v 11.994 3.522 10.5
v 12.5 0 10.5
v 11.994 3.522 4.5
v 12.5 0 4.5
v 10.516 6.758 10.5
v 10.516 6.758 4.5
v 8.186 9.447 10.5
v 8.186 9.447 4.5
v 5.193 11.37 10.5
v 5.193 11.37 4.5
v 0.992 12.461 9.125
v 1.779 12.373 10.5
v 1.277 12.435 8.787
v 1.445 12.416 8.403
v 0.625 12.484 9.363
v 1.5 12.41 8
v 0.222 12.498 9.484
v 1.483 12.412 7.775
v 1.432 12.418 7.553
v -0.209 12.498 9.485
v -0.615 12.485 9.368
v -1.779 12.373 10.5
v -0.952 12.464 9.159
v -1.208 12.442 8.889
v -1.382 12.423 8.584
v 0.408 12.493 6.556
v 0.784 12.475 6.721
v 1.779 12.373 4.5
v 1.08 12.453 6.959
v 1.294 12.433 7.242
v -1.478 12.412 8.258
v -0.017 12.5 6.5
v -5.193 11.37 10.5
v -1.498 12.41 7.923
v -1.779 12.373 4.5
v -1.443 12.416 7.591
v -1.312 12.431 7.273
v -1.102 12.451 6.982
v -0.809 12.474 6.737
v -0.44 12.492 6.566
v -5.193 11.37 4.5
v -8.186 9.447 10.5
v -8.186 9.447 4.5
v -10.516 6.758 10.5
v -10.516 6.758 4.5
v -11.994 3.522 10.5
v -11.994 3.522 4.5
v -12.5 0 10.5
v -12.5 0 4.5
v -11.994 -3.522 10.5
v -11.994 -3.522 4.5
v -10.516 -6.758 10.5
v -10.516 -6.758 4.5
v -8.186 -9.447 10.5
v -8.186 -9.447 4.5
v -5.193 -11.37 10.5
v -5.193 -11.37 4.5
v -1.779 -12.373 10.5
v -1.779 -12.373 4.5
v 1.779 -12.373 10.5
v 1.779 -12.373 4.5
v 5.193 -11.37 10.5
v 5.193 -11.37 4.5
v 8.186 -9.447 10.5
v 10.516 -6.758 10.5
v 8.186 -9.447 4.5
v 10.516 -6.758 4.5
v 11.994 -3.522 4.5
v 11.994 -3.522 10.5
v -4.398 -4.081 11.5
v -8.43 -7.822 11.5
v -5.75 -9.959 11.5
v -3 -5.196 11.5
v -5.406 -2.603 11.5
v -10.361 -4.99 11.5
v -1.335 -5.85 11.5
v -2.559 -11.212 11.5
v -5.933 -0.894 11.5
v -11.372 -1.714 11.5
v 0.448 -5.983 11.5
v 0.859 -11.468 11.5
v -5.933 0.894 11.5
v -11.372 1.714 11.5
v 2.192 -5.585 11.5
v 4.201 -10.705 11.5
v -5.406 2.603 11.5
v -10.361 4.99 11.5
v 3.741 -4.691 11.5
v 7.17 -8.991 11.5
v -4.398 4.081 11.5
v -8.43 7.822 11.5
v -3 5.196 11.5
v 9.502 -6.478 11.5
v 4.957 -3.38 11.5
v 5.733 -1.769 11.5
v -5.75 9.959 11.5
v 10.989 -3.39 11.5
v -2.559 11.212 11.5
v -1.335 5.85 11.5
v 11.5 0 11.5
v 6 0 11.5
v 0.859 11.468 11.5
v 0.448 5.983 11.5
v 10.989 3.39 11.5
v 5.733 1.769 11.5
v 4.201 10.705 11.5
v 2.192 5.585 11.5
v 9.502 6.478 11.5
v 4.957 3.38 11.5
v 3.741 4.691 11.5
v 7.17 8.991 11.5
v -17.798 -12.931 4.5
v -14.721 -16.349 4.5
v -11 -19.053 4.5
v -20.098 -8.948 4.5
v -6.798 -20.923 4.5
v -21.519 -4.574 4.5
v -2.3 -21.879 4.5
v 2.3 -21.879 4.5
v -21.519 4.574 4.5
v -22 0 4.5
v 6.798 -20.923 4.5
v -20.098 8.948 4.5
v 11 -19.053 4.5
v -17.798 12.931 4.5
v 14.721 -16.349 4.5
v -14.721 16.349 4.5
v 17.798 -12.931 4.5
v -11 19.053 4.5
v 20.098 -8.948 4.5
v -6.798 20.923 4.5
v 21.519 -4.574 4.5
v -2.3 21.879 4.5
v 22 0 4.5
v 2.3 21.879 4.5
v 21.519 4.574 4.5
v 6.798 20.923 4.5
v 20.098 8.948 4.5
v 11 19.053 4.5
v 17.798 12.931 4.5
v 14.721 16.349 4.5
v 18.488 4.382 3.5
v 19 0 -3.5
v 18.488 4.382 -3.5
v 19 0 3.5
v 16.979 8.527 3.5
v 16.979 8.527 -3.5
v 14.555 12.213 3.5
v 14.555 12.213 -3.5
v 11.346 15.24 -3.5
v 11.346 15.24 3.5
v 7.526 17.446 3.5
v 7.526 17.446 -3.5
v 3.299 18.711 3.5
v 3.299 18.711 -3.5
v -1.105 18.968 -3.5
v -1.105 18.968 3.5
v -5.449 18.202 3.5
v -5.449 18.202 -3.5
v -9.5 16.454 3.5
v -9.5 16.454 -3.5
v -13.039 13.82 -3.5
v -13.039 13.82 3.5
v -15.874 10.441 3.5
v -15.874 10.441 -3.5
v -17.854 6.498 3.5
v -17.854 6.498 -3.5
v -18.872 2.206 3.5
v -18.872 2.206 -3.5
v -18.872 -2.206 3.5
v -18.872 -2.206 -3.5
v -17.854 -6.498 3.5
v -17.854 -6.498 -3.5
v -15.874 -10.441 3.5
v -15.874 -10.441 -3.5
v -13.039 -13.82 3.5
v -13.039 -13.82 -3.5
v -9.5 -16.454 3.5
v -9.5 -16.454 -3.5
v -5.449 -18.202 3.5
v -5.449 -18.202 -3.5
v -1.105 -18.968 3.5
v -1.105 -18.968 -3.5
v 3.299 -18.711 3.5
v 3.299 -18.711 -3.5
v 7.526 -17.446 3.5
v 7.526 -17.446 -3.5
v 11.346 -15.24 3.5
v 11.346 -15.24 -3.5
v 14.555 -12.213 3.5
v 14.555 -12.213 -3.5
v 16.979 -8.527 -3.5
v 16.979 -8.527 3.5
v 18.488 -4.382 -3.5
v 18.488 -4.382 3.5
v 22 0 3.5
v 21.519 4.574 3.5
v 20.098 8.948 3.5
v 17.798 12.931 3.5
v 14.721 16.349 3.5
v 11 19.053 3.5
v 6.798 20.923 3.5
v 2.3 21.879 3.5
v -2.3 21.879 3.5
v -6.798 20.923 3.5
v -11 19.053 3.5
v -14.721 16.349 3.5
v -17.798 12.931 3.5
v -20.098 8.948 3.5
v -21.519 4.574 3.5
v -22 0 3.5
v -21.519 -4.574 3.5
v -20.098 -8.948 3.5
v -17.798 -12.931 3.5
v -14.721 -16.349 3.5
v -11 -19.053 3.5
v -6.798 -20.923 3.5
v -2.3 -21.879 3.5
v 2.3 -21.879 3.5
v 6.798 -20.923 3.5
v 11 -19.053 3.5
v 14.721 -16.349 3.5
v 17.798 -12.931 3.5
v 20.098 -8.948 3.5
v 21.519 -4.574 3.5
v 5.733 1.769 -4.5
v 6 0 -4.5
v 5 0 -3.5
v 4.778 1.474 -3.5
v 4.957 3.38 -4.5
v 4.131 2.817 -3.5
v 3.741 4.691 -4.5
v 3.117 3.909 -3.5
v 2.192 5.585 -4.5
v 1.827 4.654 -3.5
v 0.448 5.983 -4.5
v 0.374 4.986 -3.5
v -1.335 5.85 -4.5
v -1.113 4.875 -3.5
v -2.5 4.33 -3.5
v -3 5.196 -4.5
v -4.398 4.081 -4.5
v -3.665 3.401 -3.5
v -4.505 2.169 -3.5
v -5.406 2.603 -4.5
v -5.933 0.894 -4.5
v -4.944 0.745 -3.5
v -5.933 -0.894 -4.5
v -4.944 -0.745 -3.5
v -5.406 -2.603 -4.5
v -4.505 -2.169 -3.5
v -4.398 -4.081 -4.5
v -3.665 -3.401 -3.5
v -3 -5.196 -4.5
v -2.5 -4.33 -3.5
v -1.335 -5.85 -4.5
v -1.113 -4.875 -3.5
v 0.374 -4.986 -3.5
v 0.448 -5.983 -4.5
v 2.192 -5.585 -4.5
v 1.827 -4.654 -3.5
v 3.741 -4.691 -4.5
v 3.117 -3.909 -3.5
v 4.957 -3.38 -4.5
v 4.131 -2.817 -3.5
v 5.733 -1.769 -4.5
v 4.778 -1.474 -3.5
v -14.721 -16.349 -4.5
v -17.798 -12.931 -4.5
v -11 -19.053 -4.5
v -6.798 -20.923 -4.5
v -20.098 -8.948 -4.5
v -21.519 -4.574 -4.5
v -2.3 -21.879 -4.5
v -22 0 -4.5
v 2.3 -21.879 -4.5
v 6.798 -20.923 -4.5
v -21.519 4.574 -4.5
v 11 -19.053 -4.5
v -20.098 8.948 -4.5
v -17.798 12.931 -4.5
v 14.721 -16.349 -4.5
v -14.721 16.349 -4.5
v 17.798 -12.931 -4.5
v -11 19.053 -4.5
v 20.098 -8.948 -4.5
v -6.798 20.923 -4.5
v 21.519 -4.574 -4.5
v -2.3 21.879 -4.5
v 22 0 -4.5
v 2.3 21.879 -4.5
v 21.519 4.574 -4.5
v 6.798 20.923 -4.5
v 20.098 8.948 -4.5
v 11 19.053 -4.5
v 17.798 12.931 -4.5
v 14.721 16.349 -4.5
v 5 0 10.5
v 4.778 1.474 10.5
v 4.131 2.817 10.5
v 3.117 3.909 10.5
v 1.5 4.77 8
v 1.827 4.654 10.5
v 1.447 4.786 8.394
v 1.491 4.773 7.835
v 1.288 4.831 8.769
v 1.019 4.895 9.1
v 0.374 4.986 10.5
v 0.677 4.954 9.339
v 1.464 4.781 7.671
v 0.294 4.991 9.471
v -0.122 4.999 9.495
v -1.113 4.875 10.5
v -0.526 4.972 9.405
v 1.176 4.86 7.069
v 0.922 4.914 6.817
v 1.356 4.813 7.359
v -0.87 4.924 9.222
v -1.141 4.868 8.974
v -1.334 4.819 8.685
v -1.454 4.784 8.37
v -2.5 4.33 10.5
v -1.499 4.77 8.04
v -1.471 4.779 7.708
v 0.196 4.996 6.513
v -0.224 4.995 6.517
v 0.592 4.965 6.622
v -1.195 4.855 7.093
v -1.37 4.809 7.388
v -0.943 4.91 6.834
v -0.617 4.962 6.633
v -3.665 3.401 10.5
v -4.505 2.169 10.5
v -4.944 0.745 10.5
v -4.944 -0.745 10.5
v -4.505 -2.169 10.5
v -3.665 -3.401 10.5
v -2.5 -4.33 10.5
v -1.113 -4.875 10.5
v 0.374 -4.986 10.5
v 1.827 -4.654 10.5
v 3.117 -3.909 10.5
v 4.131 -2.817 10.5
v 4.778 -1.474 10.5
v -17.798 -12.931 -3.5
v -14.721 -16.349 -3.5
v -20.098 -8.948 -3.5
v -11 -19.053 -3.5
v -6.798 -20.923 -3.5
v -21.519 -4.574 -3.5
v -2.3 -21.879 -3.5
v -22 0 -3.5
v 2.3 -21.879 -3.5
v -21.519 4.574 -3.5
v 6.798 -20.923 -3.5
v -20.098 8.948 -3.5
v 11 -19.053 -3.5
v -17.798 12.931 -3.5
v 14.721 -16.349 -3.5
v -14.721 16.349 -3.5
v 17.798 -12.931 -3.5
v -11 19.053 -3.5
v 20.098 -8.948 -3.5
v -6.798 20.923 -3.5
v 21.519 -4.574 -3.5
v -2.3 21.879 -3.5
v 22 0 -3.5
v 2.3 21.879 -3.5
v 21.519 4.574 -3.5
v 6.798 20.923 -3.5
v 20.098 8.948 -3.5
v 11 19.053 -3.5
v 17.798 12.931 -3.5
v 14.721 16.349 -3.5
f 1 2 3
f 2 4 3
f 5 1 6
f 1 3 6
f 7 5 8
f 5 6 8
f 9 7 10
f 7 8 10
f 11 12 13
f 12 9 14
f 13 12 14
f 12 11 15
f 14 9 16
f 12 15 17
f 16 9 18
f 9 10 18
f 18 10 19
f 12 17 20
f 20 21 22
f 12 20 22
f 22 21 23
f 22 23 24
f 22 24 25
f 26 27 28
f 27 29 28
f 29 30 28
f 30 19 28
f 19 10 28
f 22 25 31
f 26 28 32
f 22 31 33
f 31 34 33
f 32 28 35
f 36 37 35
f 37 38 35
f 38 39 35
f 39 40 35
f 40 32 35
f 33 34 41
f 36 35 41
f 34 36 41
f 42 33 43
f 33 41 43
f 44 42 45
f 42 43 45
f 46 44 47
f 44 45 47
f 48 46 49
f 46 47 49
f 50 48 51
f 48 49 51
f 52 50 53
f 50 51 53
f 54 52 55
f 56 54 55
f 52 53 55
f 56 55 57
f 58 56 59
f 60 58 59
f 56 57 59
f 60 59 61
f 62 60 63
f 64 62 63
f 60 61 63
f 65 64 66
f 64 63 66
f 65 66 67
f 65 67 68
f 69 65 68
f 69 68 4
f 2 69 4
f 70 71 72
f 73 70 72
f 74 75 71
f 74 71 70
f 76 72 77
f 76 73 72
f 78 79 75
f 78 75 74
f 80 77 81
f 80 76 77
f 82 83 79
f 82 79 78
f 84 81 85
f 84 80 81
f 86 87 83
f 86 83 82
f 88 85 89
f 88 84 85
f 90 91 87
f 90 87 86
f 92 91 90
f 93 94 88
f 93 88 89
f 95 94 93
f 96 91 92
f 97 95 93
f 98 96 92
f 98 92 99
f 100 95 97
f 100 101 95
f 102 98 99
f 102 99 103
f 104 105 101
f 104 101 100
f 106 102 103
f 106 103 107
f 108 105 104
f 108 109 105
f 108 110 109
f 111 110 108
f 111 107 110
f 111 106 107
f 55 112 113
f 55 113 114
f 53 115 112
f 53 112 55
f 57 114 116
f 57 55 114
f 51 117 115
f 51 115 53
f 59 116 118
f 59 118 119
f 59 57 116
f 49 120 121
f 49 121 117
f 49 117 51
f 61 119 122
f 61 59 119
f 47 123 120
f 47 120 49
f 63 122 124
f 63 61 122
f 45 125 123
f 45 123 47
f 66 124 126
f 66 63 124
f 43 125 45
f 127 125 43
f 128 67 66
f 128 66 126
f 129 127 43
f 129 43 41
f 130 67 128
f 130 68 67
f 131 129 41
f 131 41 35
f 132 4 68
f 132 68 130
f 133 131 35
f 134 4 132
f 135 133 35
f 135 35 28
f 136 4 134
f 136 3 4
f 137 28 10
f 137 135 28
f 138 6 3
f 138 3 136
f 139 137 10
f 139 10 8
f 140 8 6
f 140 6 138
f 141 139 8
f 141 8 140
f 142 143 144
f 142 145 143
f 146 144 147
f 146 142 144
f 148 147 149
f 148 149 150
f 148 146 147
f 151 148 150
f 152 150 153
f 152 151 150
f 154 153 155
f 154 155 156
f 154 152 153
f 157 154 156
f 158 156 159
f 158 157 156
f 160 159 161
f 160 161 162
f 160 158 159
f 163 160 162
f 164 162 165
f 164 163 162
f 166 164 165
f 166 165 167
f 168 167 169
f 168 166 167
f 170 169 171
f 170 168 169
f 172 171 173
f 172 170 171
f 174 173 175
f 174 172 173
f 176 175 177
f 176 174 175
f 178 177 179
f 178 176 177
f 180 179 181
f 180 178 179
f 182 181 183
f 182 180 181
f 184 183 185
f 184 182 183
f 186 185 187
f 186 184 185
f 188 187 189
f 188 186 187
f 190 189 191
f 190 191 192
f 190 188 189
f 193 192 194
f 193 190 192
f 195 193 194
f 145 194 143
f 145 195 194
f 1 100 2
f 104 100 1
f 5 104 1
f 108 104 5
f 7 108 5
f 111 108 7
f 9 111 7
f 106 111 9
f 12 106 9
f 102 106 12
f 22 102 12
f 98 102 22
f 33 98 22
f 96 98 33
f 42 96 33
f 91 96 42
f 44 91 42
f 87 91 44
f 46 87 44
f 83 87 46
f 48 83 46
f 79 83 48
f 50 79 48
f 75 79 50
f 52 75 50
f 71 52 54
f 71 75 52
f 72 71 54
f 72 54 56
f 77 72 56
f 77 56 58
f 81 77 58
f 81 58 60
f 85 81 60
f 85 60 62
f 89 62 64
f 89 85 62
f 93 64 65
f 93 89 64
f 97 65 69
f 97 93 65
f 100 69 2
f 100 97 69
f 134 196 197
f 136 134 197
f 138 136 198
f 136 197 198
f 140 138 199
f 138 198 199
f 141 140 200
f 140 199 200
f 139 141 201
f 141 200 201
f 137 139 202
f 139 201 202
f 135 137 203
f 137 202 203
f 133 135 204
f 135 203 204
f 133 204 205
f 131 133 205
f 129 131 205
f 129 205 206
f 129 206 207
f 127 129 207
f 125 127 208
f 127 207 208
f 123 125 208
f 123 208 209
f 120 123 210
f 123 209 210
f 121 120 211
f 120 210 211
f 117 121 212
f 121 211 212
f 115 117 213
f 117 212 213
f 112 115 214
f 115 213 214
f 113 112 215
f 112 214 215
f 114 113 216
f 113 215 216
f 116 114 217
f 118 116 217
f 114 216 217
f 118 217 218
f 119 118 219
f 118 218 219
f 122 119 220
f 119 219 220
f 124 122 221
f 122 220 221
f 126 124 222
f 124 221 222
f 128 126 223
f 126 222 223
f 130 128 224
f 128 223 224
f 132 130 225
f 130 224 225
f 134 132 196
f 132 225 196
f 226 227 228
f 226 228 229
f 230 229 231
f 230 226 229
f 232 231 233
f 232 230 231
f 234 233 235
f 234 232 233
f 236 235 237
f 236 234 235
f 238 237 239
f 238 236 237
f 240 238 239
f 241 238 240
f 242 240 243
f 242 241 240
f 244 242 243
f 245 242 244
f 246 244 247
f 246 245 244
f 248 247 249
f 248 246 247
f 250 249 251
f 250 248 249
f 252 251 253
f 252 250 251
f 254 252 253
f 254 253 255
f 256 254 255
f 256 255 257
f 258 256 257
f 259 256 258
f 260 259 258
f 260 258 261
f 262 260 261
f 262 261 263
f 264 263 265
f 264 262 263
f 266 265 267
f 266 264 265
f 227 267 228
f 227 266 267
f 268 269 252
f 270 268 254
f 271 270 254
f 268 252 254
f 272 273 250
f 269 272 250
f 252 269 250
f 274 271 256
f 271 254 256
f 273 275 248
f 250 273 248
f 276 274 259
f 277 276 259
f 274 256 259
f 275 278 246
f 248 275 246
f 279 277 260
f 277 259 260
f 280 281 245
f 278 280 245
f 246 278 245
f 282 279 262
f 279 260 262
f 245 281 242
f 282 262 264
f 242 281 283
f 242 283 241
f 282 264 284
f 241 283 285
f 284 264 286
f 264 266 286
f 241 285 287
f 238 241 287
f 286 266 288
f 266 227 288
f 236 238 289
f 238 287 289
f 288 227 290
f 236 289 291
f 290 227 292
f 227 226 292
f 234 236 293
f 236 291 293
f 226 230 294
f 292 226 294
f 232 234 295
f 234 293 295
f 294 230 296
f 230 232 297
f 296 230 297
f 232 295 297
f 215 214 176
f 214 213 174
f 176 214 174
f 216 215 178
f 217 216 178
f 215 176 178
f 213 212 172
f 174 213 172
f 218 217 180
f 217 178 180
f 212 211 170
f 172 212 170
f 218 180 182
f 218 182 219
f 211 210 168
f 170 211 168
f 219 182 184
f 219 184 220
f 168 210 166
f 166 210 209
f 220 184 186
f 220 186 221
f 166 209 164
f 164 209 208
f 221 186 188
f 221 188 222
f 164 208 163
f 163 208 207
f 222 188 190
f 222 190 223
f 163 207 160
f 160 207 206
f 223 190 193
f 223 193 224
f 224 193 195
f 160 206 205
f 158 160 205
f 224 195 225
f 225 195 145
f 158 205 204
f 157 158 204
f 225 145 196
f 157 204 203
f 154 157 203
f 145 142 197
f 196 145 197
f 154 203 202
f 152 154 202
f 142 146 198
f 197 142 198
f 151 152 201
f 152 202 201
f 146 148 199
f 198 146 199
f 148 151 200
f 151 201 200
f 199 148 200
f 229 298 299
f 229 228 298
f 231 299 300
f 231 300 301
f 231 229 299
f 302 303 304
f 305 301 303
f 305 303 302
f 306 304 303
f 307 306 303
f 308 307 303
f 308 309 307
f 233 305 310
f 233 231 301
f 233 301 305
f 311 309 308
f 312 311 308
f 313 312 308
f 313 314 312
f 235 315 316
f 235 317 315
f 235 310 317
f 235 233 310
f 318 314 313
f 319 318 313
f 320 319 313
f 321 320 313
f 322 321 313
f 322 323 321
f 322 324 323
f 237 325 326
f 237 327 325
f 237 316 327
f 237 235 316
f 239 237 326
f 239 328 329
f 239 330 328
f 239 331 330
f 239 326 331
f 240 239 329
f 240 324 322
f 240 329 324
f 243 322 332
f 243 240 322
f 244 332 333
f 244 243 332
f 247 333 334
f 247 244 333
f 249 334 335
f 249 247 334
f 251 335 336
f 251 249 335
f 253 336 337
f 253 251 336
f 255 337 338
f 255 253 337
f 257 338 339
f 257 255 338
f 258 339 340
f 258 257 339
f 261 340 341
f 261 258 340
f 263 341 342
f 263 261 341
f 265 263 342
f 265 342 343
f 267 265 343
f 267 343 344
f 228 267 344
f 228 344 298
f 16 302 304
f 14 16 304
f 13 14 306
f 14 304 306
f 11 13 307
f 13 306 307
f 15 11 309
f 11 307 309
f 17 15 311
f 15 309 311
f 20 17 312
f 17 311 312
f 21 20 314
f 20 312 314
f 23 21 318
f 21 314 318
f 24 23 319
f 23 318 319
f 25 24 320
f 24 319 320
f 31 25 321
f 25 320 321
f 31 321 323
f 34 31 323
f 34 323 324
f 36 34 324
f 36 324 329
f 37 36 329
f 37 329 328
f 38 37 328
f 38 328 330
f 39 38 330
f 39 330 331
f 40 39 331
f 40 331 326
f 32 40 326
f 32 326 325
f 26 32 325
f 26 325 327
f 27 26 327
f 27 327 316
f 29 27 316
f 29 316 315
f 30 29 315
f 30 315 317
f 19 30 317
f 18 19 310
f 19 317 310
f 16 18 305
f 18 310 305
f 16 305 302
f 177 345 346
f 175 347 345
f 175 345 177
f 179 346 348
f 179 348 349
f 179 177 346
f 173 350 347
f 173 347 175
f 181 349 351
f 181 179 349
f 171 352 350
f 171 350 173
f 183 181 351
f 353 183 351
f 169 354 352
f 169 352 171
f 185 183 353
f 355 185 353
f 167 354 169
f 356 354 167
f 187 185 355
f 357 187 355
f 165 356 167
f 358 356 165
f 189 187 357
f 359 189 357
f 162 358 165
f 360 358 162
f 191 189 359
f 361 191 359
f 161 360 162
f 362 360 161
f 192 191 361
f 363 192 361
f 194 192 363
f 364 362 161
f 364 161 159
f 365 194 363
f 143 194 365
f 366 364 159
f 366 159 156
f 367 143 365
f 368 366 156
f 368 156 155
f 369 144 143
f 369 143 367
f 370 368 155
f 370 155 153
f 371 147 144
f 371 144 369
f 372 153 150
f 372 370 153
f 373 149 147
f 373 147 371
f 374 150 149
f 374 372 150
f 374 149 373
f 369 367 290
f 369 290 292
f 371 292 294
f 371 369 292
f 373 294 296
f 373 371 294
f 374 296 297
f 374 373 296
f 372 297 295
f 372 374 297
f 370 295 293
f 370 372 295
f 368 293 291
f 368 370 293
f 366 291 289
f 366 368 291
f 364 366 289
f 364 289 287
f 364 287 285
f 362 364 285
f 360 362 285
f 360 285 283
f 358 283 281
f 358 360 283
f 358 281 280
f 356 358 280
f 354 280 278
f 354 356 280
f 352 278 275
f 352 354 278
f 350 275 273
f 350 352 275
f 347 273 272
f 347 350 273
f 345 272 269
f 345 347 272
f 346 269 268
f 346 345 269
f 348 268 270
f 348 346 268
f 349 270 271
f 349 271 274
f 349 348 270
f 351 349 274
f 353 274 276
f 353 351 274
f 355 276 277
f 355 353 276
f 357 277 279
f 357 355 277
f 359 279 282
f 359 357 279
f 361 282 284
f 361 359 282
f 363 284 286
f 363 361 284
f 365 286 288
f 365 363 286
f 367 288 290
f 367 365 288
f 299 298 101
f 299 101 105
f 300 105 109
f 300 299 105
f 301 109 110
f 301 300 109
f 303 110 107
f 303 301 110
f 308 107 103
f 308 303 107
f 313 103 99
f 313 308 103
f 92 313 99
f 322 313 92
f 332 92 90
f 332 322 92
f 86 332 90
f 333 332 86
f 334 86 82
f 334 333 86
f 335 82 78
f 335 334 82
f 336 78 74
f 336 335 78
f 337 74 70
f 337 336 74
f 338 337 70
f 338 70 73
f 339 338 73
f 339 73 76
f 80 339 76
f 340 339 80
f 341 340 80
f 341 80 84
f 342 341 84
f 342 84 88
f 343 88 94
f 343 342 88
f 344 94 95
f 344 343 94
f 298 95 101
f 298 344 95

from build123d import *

# Parameters (mm, degrees)
F0_R     = 19
F0_R_2   = 5
F1_DEPTH = 3.5
F2_R     = 22
F2_R_2   = 5
F3_DEPTH = 1
F5_R     = 12.5
F5_R_2   = 5
F6_DEPTH = 7
F7_SIZE  = 1
F8_R     = 1.5
F9_DEPTH = 22.001


with BuildPart() as f1:
    # F0 (on Top) → F1 (new body, symmetric)
    with BuildSketch(Plane.XY):
        Circle(F0_R)
        Circle(F0_R_2, mode=Mode.SUBTRACT)
    extrude(amount=F1_DEPTH, both=True)

    # F2 (on face) → F3 (join)
    with BuildSketch(Plane.XY.offset(3.5)):
        Circle(F2_R)
        Circle(F2_R_2, mode=Mode.SUBTRACT)
    extrude(amount=F3_DEPTH)

    # F4: F1 across plane


with BuildPart() as f1_1:
    add(f1.part)
    add(f1.part.mirror(Plane.XY))

    # F5 (on face) → F6 (join)
    with BuildSketch(Plane.XY.offset(4.5)):
        Circle(F5_R)
        Circle(F5_R_2, mode=Mode.SUBTRACT)
    extrude(amount=F6_DEPTH)

    # F7
    f7_edges = [f1_1.edges().sort_by_distance(p)[0] for p in [
        (-12.5, 0, 11.5),
        (-5, 0, 11.5),
        (-5, 0, -4.5),
    ]]
    chamfer(f7_edges, length=F7_SIZE)

    # F8 (on Front) → F9 (cut, through all)
    with BuildSketch(Plane.XZ):
        with Locations((0, 8)):
            Circle(F8_R)
    extrude(amount=-F9_DEPTH, mode=Mode.SUBTRACT)


solid = f1_1.part
